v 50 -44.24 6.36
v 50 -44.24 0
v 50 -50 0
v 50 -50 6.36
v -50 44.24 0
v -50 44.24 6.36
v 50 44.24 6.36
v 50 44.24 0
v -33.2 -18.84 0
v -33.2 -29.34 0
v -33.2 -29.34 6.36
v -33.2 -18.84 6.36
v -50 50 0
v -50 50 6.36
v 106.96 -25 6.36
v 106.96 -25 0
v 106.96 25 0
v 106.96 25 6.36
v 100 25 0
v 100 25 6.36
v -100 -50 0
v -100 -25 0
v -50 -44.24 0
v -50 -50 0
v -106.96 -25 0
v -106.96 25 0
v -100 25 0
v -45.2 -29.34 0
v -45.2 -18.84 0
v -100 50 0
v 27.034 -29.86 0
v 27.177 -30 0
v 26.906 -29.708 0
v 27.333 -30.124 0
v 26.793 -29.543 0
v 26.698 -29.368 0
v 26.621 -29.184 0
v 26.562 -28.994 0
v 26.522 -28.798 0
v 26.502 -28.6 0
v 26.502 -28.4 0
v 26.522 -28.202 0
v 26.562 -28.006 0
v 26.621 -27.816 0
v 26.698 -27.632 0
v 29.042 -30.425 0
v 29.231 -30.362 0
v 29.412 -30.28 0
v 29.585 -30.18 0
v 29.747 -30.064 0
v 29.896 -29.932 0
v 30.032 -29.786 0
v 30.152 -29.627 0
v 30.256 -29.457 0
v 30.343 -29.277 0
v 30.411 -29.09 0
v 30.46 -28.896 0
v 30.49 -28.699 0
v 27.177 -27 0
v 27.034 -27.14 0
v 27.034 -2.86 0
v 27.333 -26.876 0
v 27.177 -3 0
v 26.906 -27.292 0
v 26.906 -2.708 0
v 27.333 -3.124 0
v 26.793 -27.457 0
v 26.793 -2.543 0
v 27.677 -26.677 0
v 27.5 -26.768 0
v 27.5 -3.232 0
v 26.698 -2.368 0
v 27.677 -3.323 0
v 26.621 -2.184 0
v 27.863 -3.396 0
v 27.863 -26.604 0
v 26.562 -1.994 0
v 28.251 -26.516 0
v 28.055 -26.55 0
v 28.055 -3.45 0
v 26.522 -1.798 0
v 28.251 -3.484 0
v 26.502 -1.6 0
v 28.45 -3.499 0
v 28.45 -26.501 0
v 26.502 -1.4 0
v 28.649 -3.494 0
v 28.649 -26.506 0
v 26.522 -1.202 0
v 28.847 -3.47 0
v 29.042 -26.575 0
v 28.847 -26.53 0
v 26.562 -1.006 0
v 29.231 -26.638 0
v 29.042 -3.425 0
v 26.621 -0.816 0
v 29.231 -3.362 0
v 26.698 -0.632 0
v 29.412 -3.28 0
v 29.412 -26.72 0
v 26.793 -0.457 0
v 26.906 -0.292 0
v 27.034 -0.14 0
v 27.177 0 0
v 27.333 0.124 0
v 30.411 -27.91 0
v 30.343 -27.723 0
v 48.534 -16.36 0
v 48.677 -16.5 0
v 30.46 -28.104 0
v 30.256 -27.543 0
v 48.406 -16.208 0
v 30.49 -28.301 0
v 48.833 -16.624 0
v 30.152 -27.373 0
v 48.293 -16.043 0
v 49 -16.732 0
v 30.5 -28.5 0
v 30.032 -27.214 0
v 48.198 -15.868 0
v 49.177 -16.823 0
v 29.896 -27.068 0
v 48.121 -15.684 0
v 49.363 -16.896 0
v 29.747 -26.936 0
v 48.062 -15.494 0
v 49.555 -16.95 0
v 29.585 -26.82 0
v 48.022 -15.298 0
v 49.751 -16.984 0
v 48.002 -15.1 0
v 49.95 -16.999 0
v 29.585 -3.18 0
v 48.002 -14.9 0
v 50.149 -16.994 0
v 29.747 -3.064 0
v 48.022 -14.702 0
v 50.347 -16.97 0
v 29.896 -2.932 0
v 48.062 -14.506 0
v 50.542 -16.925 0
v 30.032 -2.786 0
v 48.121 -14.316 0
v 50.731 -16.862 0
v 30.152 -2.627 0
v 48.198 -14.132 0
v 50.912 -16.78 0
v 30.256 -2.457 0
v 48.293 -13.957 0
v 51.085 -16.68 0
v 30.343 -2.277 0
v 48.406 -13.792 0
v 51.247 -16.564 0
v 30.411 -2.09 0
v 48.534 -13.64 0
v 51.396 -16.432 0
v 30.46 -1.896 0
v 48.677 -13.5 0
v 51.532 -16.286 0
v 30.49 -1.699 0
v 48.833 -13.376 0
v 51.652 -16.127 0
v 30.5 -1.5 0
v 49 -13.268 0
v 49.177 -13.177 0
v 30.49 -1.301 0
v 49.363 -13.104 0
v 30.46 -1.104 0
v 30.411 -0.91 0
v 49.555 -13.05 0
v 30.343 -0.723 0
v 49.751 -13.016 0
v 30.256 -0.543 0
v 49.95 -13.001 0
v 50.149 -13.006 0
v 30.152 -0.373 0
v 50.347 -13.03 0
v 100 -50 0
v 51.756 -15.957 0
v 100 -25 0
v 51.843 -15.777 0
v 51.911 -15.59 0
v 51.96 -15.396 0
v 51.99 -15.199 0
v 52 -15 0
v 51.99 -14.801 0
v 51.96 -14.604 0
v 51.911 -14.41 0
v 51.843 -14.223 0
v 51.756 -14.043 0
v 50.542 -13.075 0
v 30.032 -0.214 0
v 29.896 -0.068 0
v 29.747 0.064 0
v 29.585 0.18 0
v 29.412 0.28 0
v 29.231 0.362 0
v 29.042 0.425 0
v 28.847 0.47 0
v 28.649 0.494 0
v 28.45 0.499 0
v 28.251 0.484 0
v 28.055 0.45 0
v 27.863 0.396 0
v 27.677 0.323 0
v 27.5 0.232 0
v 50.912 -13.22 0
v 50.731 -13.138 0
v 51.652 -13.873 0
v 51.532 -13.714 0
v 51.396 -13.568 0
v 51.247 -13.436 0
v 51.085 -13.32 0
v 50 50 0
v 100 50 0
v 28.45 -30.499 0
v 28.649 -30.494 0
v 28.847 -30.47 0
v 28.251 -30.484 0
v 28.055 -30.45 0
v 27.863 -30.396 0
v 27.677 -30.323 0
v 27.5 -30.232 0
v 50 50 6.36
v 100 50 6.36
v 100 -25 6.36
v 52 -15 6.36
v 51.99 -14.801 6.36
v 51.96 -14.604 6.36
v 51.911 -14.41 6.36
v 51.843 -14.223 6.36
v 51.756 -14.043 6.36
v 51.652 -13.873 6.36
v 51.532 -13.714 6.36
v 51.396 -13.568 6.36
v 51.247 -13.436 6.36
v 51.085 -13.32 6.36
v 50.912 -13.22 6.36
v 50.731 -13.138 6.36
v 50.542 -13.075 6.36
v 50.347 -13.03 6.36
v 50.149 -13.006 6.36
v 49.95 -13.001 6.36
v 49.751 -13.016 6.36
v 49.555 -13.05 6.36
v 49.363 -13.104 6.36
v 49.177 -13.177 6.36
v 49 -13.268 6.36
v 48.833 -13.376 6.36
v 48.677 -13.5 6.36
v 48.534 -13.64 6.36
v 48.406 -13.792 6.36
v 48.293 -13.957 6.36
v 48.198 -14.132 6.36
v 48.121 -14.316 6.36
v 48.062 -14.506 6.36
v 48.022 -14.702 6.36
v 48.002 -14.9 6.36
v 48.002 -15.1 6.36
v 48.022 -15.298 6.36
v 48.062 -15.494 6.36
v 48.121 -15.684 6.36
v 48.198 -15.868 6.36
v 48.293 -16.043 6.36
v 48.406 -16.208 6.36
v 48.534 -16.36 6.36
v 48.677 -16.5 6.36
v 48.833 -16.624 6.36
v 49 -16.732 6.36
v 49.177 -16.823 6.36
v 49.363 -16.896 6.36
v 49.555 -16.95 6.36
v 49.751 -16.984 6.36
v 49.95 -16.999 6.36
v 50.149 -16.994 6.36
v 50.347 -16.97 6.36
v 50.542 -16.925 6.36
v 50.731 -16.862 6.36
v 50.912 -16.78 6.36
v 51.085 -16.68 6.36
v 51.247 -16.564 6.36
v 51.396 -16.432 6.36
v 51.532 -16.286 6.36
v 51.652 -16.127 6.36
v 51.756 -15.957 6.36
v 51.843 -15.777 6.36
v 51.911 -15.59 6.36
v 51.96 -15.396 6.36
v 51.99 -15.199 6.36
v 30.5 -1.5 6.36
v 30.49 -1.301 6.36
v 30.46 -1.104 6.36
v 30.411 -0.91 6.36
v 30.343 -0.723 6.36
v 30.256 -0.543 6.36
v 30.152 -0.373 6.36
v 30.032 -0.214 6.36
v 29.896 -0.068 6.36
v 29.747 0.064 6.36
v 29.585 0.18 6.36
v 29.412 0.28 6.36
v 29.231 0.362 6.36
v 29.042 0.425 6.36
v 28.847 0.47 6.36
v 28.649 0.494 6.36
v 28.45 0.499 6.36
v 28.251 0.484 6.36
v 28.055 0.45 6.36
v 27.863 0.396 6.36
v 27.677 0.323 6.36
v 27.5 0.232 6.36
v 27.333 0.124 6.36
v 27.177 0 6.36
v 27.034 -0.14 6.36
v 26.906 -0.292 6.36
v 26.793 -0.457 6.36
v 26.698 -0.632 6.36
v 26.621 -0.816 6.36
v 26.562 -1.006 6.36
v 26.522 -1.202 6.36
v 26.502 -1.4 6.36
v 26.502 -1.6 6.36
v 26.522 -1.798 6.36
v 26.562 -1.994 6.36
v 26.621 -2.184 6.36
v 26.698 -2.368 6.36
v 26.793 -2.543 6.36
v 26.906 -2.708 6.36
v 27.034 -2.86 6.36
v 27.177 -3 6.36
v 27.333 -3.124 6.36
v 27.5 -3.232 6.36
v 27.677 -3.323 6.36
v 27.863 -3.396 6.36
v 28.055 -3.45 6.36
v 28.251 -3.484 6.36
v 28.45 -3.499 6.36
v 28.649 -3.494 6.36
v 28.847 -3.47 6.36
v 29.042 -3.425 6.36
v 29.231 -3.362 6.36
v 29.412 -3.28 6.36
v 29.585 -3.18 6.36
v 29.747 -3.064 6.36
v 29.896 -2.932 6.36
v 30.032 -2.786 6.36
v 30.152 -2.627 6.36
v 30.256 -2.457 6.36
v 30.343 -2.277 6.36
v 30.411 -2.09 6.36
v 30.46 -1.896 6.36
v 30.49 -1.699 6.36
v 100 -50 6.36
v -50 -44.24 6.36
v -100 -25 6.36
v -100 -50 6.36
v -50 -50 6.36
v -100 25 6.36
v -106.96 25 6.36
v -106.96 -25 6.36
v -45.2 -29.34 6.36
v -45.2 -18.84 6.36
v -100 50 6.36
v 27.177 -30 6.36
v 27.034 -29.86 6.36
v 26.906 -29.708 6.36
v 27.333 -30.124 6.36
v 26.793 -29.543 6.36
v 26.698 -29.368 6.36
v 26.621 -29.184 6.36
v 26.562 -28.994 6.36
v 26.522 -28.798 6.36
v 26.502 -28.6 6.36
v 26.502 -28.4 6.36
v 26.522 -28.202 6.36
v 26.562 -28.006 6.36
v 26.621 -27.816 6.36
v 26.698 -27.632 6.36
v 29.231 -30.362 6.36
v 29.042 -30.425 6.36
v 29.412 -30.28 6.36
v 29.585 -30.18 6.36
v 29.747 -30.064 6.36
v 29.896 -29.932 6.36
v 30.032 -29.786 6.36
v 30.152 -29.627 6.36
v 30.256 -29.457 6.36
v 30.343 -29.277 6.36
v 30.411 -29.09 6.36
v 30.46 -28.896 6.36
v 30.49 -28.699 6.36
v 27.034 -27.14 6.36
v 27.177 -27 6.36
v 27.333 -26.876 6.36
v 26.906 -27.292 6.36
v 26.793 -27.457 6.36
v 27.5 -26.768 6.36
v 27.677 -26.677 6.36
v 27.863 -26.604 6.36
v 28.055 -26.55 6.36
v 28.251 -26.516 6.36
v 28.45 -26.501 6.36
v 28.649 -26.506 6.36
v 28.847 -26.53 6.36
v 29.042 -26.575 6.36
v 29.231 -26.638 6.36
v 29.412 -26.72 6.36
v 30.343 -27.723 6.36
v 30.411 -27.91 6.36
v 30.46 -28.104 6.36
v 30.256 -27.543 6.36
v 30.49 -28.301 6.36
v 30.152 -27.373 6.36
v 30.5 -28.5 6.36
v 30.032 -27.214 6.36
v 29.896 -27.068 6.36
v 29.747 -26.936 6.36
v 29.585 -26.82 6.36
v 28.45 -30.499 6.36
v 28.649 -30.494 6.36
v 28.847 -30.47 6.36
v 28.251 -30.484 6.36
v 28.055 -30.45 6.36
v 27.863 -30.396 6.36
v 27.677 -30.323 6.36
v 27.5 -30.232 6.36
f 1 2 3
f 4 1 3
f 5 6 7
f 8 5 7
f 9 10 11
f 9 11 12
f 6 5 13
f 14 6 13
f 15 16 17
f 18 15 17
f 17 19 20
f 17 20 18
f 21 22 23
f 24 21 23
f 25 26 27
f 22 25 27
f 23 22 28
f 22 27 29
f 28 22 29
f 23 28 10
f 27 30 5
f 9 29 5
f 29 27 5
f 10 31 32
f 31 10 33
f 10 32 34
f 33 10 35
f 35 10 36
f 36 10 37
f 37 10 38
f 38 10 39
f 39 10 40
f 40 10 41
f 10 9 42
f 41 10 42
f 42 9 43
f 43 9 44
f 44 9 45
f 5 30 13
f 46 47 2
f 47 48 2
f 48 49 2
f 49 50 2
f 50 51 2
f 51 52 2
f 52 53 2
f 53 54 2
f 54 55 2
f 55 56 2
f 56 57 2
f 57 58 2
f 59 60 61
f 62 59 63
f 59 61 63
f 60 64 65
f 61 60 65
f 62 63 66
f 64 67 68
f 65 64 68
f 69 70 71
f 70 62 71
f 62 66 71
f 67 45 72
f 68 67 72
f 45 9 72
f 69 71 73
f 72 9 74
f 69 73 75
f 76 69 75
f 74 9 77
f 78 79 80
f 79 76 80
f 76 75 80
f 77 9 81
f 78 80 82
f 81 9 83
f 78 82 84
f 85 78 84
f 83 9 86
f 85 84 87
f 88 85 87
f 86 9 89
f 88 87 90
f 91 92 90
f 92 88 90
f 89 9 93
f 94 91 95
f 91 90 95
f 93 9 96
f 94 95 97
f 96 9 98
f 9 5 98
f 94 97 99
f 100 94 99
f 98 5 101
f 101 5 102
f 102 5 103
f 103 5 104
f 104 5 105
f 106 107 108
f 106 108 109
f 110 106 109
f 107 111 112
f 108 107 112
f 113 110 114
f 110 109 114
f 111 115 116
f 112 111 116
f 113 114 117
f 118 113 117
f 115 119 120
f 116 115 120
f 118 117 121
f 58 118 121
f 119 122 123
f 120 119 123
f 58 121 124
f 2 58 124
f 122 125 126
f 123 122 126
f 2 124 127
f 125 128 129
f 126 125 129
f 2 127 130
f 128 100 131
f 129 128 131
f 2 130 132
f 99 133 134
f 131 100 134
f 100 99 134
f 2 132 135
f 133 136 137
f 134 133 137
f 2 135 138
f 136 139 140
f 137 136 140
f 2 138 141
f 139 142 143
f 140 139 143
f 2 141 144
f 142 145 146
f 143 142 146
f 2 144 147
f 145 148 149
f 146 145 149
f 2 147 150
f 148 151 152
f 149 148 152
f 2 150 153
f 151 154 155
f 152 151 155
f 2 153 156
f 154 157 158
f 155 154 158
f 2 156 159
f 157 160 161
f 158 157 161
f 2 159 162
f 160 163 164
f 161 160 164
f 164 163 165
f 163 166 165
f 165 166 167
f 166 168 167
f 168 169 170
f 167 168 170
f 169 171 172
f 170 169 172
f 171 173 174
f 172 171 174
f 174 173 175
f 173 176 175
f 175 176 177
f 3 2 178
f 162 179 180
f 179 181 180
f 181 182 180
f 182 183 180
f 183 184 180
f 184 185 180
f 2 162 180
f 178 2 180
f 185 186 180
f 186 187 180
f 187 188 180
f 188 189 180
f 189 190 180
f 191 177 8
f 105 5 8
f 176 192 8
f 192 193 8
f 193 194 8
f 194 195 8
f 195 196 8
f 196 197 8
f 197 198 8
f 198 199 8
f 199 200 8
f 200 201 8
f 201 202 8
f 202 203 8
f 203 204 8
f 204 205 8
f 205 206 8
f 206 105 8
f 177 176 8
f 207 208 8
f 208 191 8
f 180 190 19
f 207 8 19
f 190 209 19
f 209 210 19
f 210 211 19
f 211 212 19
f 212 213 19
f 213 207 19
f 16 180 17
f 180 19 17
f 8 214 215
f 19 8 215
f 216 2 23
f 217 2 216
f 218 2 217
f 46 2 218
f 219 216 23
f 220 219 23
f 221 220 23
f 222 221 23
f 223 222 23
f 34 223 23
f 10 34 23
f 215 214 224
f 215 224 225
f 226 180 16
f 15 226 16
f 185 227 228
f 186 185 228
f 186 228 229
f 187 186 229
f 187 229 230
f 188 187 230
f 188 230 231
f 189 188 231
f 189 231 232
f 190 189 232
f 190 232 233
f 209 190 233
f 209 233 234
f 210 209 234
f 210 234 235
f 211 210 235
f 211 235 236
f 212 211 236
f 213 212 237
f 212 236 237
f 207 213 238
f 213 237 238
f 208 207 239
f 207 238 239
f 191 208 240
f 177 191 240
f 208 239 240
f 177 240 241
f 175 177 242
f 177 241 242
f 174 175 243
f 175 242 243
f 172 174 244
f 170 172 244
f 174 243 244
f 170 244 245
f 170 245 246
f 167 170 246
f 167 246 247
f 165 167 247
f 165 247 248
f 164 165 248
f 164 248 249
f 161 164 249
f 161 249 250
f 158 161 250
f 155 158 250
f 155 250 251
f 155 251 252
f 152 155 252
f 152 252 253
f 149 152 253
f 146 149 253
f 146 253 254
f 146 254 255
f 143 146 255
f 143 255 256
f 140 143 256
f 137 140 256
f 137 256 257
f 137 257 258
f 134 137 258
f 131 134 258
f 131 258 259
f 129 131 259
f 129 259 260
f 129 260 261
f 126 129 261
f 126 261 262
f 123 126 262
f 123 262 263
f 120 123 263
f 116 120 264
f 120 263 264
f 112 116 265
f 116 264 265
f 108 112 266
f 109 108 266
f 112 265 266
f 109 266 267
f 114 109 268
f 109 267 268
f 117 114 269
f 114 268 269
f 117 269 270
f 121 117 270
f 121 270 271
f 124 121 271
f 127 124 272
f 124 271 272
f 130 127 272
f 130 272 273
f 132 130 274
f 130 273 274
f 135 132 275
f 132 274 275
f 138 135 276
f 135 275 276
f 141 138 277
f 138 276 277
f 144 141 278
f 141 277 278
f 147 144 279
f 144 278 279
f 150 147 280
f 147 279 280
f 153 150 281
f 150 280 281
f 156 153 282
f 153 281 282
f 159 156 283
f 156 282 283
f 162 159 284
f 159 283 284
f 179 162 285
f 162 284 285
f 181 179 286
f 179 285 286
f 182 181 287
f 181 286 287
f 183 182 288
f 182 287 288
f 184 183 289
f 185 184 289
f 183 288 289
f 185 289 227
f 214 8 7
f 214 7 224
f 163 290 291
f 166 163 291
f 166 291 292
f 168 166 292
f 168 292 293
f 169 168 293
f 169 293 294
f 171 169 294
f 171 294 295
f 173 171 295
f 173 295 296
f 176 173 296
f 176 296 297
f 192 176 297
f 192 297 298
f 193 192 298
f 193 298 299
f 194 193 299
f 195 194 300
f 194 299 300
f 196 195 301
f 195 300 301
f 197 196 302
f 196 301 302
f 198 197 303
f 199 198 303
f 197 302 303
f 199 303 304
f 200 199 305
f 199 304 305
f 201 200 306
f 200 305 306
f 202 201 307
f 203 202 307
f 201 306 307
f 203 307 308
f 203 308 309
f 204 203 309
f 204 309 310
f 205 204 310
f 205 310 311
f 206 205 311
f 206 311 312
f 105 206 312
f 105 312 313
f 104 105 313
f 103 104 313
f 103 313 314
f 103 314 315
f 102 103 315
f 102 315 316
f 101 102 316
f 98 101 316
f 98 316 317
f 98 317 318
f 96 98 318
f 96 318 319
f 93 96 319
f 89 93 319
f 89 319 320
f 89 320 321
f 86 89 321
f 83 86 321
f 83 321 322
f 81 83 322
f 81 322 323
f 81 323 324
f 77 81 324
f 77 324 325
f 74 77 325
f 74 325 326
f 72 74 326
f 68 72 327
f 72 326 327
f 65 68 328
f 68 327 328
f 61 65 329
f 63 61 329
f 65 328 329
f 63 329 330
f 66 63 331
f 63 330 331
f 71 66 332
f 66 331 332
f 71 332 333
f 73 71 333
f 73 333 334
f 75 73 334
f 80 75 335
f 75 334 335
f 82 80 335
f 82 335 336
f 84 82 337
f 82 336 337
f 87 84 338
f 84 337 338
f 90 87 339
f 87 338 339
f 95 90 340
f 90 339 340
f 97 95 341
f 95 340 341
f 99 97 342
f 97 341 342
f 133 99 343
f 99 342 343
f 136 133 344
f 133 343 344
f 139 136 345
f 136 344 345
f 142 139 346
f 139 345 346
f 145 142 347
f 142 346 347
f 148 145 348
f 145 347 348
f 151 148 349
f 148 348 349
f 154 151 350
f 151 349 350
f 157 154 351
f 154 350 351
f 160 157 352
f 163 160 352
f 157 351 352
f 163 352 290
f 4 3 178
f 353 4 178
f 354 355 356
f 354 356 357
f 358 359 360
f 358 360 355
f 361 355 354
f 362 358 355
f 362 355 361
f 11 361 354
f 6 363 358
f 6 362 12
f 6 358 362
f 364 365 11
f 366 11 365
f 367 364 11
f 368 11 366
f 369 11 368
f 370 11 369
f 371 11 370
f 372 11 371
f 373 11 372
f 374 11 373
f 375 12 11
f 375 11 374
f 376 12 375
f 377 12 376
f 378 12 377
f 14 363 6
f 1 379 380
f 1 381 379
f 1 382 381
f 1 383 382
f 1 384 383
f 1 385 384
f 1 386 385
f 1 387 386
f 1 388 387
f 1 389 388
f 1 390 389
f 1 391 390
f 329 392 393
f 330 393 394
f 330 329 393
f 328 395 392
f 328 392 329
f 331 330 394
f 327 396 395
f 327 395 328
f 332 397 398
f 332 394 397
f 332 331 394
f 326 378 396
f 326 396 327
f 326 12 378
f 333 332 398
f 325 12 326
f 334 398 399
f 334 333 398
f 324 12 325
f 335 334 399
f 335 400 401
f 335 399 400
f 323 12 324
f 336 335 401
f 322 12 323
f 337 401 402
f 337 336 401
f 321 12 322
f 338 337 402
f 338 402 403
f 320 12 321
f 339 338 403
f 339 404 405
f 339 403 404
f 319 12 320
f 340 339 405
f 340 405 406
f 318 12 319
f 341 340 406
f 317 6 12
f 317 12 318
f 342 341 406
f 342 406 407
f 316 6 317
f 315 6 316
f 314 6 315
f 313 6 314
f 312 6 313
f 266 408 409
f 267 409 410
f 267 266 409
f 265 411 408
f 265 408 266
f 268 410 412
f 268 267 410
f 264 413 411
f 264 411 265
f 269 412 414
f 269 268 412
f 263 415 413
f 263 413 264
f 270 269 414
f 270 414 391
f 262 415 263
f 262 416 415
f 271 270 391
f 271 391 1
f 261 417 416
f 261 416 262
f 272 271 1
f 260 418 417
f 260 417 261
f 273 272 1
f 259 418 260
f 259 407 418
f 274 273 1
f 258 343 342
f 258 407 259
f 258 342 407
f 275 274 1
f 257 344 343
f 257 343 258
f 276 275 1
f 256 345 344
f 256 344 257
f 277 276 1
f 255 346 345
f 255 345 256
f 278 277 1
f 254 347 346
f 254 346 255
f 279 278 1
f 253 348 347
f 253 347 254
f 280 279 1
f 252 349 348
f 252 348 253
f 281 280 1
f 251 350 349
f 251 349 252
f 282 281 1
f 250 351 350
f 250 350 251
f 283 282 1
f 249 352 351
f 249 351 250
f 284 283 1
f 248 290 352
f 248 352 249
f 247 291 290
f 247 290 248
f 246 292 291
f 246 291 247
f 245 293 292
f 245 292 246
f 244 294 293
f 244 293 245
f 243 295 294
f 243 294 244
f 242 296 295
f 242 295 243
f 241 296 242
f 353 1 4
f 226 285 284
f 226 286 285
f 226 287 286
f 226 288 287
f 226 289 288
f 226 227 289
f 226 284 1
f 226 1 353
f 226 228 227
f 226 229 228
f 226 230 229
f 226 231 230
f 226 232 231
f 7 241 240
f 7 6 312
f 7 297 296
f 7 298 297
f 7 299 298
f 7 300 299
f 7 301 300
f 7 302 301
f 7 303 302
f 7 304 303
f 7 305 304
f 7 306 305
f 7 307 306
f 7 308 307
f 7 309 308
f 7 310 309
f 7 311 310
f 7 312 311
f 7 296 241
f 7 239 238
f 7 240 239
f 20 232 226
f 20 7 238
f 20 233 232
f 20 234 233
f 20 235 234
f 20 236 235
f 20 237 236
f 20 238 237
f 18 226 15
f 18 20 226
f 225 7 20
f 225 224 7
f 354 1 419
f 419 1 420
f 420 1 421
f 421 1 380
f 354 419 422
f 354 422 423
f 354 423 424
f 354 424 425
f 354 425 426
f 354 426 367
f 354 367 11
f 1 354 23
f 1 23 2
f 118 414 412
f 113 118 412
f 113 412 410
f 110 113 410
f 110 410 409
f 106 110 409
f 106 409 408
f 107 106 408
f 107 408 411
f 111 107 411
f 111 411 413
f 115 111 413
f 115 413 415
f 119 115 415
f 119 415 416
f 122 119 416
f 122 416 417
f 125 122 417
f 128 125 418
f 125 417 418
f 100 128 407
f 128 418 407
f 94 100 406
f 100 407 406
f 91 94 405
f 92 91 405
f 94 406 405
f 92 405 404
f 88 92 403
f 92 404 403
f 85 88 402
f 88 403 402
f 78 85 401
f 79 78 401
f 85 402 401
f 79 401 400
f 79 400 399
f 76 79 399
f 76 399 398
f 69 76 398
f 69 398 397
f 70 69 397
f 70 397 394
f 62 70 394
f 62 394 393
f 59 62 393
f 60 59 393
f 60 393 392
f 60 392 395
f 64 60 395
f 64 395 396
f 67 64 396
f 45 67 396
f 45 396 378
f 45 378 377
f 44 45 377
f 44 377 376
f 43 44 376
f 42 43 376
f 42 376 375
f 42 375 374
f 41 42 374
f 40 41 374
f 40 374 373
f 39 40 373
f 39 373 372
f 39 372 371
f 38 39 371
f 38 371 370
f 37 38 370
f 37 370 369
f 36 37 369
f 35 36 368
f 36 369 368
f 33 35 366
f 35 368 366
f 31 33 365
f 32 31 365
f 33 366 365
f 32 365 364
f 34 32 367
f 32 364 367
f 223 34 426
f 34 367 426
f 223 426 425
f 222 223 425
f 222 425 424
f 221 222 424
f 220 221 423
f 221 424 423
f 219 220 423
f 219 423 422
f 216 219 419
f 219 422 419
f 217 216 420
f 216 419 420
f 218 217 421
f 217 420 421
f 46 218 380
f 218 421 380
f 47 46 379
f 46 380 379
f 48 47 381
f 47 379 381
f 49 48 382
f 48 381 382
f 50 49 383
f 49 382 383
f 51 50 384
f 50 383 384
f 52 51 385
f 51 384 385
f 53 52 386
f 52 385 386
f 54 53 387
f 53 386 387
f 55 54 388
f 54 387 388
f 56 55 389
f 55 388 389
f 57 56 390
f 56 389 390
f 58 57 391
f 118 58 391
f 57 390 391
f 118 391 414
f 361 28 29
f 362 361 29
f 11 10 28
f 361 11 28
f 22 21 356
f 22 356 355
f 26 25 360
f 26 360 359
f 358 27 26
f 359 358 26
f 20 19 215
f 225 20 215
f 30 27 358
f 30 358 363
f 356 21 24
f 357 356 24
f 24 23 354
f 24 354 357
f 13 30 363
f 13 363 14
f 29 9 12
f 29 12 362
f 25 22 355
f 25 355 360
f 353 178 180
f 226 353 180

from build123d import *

# Parameters (mm, degrees)
SKETCH1_W           = 200
SKETCH1_H           = 100
BOSS_EXTRUDE1_DEPTH = 6.36
SKETCH9_W           = 6.96
SKETCH9_H           = 50
BOSS_EXTRUDE5_DEPTH = 6.36
SKETCH10_W          = 100
SKETCH10_H          = 5.76
CUT_EXTRUDE1_DEPTH  = 119.240818671
SKETCH13_R          = 2
BATTERY_HOLES_DEPTH = 10
SKETCH14_W          = 12
SKETCH14_H          = 10.5
CUT_EXTRUDE6_DEPTH  = 119.240818671


with BuildPart() as part:
    # Sketch1 → Boss-Extrude1 (new body)
    with BuildSketch(Plane.XY):
        Rectangle(SKETCH1_W, SKETCH1_H)
    extrude(amount=BOSS_EXTRUDE1_DEPTH)

    # Sketch9 → Boss-Extrude5 (add)
    with BuildSketch(Plane(origin=(0, 0, 0), x_dir=(-1, 0, 0), z_dir=(0, 0, -1))):
        with Locations((103.48, 0)):
            Rectangle(SKETCH9_W, SKETCH9_H)
    boss_extrude5 = extrude(amount=-BOSS_EXTRUDE5_DEPTH)

    # Mirror5: Boss-Extrude5 across plane
    add(boss_extrude5.mirror(Plane(origin=(0, 0, 0), x_dir=(0, 0, 1), z_dir=(1, 0, 0))))

    # Sketch10 → Cut-Extrude1 (cut, symmetric)
    with BuildSketch(Plane.XY.offset(6.36)):
        with Locations((0, 47.12)):
            Rectangle(SKETCH10_W, SKETCH10_H)
    cut_extrude1 = extrude(amount=CUT_EXTRUDE1_DEPTH, both=True, mode=Mode.SUBTRACT)

    # Mirror6: Cut-Extrude1 across plane
    add(cut_extrude1.mirror(Plane.ZX), mode=Mode.SUBTRACT)

    # Sketch13 → battery holes (cut)
    with BuildSketch(Plane.XY.offset(6.36)):
        with Locations((50, -15)):
            Circle(SKETCH13_R)
        with Locations((28.5, -1.5)):
            Circle(SKETCH13_R)
        with Locations((28.5, -28.5)):
            Circle(SKETCH13_R)
    extrude(amount=-BATTERY_HOLES_DEPTH, mode=Mode.SUBTRACT)

    # Sketch14 → Cut-Extrude6 (cut, through all)
    with BuildSketch(Plane(origin=(0, 0, 0), x_dir=(-1, 0, 0), z_dir=(0, 0, -1))):
        with Locations((39.2, -24.09)):
            Rectangle(SKETCH14_W, SKETCH14_H)
    extrude(amount=-CUT_EXTRUDE6_DEPTH, mode=Mode.SUBTRACT)


solid = part.part
